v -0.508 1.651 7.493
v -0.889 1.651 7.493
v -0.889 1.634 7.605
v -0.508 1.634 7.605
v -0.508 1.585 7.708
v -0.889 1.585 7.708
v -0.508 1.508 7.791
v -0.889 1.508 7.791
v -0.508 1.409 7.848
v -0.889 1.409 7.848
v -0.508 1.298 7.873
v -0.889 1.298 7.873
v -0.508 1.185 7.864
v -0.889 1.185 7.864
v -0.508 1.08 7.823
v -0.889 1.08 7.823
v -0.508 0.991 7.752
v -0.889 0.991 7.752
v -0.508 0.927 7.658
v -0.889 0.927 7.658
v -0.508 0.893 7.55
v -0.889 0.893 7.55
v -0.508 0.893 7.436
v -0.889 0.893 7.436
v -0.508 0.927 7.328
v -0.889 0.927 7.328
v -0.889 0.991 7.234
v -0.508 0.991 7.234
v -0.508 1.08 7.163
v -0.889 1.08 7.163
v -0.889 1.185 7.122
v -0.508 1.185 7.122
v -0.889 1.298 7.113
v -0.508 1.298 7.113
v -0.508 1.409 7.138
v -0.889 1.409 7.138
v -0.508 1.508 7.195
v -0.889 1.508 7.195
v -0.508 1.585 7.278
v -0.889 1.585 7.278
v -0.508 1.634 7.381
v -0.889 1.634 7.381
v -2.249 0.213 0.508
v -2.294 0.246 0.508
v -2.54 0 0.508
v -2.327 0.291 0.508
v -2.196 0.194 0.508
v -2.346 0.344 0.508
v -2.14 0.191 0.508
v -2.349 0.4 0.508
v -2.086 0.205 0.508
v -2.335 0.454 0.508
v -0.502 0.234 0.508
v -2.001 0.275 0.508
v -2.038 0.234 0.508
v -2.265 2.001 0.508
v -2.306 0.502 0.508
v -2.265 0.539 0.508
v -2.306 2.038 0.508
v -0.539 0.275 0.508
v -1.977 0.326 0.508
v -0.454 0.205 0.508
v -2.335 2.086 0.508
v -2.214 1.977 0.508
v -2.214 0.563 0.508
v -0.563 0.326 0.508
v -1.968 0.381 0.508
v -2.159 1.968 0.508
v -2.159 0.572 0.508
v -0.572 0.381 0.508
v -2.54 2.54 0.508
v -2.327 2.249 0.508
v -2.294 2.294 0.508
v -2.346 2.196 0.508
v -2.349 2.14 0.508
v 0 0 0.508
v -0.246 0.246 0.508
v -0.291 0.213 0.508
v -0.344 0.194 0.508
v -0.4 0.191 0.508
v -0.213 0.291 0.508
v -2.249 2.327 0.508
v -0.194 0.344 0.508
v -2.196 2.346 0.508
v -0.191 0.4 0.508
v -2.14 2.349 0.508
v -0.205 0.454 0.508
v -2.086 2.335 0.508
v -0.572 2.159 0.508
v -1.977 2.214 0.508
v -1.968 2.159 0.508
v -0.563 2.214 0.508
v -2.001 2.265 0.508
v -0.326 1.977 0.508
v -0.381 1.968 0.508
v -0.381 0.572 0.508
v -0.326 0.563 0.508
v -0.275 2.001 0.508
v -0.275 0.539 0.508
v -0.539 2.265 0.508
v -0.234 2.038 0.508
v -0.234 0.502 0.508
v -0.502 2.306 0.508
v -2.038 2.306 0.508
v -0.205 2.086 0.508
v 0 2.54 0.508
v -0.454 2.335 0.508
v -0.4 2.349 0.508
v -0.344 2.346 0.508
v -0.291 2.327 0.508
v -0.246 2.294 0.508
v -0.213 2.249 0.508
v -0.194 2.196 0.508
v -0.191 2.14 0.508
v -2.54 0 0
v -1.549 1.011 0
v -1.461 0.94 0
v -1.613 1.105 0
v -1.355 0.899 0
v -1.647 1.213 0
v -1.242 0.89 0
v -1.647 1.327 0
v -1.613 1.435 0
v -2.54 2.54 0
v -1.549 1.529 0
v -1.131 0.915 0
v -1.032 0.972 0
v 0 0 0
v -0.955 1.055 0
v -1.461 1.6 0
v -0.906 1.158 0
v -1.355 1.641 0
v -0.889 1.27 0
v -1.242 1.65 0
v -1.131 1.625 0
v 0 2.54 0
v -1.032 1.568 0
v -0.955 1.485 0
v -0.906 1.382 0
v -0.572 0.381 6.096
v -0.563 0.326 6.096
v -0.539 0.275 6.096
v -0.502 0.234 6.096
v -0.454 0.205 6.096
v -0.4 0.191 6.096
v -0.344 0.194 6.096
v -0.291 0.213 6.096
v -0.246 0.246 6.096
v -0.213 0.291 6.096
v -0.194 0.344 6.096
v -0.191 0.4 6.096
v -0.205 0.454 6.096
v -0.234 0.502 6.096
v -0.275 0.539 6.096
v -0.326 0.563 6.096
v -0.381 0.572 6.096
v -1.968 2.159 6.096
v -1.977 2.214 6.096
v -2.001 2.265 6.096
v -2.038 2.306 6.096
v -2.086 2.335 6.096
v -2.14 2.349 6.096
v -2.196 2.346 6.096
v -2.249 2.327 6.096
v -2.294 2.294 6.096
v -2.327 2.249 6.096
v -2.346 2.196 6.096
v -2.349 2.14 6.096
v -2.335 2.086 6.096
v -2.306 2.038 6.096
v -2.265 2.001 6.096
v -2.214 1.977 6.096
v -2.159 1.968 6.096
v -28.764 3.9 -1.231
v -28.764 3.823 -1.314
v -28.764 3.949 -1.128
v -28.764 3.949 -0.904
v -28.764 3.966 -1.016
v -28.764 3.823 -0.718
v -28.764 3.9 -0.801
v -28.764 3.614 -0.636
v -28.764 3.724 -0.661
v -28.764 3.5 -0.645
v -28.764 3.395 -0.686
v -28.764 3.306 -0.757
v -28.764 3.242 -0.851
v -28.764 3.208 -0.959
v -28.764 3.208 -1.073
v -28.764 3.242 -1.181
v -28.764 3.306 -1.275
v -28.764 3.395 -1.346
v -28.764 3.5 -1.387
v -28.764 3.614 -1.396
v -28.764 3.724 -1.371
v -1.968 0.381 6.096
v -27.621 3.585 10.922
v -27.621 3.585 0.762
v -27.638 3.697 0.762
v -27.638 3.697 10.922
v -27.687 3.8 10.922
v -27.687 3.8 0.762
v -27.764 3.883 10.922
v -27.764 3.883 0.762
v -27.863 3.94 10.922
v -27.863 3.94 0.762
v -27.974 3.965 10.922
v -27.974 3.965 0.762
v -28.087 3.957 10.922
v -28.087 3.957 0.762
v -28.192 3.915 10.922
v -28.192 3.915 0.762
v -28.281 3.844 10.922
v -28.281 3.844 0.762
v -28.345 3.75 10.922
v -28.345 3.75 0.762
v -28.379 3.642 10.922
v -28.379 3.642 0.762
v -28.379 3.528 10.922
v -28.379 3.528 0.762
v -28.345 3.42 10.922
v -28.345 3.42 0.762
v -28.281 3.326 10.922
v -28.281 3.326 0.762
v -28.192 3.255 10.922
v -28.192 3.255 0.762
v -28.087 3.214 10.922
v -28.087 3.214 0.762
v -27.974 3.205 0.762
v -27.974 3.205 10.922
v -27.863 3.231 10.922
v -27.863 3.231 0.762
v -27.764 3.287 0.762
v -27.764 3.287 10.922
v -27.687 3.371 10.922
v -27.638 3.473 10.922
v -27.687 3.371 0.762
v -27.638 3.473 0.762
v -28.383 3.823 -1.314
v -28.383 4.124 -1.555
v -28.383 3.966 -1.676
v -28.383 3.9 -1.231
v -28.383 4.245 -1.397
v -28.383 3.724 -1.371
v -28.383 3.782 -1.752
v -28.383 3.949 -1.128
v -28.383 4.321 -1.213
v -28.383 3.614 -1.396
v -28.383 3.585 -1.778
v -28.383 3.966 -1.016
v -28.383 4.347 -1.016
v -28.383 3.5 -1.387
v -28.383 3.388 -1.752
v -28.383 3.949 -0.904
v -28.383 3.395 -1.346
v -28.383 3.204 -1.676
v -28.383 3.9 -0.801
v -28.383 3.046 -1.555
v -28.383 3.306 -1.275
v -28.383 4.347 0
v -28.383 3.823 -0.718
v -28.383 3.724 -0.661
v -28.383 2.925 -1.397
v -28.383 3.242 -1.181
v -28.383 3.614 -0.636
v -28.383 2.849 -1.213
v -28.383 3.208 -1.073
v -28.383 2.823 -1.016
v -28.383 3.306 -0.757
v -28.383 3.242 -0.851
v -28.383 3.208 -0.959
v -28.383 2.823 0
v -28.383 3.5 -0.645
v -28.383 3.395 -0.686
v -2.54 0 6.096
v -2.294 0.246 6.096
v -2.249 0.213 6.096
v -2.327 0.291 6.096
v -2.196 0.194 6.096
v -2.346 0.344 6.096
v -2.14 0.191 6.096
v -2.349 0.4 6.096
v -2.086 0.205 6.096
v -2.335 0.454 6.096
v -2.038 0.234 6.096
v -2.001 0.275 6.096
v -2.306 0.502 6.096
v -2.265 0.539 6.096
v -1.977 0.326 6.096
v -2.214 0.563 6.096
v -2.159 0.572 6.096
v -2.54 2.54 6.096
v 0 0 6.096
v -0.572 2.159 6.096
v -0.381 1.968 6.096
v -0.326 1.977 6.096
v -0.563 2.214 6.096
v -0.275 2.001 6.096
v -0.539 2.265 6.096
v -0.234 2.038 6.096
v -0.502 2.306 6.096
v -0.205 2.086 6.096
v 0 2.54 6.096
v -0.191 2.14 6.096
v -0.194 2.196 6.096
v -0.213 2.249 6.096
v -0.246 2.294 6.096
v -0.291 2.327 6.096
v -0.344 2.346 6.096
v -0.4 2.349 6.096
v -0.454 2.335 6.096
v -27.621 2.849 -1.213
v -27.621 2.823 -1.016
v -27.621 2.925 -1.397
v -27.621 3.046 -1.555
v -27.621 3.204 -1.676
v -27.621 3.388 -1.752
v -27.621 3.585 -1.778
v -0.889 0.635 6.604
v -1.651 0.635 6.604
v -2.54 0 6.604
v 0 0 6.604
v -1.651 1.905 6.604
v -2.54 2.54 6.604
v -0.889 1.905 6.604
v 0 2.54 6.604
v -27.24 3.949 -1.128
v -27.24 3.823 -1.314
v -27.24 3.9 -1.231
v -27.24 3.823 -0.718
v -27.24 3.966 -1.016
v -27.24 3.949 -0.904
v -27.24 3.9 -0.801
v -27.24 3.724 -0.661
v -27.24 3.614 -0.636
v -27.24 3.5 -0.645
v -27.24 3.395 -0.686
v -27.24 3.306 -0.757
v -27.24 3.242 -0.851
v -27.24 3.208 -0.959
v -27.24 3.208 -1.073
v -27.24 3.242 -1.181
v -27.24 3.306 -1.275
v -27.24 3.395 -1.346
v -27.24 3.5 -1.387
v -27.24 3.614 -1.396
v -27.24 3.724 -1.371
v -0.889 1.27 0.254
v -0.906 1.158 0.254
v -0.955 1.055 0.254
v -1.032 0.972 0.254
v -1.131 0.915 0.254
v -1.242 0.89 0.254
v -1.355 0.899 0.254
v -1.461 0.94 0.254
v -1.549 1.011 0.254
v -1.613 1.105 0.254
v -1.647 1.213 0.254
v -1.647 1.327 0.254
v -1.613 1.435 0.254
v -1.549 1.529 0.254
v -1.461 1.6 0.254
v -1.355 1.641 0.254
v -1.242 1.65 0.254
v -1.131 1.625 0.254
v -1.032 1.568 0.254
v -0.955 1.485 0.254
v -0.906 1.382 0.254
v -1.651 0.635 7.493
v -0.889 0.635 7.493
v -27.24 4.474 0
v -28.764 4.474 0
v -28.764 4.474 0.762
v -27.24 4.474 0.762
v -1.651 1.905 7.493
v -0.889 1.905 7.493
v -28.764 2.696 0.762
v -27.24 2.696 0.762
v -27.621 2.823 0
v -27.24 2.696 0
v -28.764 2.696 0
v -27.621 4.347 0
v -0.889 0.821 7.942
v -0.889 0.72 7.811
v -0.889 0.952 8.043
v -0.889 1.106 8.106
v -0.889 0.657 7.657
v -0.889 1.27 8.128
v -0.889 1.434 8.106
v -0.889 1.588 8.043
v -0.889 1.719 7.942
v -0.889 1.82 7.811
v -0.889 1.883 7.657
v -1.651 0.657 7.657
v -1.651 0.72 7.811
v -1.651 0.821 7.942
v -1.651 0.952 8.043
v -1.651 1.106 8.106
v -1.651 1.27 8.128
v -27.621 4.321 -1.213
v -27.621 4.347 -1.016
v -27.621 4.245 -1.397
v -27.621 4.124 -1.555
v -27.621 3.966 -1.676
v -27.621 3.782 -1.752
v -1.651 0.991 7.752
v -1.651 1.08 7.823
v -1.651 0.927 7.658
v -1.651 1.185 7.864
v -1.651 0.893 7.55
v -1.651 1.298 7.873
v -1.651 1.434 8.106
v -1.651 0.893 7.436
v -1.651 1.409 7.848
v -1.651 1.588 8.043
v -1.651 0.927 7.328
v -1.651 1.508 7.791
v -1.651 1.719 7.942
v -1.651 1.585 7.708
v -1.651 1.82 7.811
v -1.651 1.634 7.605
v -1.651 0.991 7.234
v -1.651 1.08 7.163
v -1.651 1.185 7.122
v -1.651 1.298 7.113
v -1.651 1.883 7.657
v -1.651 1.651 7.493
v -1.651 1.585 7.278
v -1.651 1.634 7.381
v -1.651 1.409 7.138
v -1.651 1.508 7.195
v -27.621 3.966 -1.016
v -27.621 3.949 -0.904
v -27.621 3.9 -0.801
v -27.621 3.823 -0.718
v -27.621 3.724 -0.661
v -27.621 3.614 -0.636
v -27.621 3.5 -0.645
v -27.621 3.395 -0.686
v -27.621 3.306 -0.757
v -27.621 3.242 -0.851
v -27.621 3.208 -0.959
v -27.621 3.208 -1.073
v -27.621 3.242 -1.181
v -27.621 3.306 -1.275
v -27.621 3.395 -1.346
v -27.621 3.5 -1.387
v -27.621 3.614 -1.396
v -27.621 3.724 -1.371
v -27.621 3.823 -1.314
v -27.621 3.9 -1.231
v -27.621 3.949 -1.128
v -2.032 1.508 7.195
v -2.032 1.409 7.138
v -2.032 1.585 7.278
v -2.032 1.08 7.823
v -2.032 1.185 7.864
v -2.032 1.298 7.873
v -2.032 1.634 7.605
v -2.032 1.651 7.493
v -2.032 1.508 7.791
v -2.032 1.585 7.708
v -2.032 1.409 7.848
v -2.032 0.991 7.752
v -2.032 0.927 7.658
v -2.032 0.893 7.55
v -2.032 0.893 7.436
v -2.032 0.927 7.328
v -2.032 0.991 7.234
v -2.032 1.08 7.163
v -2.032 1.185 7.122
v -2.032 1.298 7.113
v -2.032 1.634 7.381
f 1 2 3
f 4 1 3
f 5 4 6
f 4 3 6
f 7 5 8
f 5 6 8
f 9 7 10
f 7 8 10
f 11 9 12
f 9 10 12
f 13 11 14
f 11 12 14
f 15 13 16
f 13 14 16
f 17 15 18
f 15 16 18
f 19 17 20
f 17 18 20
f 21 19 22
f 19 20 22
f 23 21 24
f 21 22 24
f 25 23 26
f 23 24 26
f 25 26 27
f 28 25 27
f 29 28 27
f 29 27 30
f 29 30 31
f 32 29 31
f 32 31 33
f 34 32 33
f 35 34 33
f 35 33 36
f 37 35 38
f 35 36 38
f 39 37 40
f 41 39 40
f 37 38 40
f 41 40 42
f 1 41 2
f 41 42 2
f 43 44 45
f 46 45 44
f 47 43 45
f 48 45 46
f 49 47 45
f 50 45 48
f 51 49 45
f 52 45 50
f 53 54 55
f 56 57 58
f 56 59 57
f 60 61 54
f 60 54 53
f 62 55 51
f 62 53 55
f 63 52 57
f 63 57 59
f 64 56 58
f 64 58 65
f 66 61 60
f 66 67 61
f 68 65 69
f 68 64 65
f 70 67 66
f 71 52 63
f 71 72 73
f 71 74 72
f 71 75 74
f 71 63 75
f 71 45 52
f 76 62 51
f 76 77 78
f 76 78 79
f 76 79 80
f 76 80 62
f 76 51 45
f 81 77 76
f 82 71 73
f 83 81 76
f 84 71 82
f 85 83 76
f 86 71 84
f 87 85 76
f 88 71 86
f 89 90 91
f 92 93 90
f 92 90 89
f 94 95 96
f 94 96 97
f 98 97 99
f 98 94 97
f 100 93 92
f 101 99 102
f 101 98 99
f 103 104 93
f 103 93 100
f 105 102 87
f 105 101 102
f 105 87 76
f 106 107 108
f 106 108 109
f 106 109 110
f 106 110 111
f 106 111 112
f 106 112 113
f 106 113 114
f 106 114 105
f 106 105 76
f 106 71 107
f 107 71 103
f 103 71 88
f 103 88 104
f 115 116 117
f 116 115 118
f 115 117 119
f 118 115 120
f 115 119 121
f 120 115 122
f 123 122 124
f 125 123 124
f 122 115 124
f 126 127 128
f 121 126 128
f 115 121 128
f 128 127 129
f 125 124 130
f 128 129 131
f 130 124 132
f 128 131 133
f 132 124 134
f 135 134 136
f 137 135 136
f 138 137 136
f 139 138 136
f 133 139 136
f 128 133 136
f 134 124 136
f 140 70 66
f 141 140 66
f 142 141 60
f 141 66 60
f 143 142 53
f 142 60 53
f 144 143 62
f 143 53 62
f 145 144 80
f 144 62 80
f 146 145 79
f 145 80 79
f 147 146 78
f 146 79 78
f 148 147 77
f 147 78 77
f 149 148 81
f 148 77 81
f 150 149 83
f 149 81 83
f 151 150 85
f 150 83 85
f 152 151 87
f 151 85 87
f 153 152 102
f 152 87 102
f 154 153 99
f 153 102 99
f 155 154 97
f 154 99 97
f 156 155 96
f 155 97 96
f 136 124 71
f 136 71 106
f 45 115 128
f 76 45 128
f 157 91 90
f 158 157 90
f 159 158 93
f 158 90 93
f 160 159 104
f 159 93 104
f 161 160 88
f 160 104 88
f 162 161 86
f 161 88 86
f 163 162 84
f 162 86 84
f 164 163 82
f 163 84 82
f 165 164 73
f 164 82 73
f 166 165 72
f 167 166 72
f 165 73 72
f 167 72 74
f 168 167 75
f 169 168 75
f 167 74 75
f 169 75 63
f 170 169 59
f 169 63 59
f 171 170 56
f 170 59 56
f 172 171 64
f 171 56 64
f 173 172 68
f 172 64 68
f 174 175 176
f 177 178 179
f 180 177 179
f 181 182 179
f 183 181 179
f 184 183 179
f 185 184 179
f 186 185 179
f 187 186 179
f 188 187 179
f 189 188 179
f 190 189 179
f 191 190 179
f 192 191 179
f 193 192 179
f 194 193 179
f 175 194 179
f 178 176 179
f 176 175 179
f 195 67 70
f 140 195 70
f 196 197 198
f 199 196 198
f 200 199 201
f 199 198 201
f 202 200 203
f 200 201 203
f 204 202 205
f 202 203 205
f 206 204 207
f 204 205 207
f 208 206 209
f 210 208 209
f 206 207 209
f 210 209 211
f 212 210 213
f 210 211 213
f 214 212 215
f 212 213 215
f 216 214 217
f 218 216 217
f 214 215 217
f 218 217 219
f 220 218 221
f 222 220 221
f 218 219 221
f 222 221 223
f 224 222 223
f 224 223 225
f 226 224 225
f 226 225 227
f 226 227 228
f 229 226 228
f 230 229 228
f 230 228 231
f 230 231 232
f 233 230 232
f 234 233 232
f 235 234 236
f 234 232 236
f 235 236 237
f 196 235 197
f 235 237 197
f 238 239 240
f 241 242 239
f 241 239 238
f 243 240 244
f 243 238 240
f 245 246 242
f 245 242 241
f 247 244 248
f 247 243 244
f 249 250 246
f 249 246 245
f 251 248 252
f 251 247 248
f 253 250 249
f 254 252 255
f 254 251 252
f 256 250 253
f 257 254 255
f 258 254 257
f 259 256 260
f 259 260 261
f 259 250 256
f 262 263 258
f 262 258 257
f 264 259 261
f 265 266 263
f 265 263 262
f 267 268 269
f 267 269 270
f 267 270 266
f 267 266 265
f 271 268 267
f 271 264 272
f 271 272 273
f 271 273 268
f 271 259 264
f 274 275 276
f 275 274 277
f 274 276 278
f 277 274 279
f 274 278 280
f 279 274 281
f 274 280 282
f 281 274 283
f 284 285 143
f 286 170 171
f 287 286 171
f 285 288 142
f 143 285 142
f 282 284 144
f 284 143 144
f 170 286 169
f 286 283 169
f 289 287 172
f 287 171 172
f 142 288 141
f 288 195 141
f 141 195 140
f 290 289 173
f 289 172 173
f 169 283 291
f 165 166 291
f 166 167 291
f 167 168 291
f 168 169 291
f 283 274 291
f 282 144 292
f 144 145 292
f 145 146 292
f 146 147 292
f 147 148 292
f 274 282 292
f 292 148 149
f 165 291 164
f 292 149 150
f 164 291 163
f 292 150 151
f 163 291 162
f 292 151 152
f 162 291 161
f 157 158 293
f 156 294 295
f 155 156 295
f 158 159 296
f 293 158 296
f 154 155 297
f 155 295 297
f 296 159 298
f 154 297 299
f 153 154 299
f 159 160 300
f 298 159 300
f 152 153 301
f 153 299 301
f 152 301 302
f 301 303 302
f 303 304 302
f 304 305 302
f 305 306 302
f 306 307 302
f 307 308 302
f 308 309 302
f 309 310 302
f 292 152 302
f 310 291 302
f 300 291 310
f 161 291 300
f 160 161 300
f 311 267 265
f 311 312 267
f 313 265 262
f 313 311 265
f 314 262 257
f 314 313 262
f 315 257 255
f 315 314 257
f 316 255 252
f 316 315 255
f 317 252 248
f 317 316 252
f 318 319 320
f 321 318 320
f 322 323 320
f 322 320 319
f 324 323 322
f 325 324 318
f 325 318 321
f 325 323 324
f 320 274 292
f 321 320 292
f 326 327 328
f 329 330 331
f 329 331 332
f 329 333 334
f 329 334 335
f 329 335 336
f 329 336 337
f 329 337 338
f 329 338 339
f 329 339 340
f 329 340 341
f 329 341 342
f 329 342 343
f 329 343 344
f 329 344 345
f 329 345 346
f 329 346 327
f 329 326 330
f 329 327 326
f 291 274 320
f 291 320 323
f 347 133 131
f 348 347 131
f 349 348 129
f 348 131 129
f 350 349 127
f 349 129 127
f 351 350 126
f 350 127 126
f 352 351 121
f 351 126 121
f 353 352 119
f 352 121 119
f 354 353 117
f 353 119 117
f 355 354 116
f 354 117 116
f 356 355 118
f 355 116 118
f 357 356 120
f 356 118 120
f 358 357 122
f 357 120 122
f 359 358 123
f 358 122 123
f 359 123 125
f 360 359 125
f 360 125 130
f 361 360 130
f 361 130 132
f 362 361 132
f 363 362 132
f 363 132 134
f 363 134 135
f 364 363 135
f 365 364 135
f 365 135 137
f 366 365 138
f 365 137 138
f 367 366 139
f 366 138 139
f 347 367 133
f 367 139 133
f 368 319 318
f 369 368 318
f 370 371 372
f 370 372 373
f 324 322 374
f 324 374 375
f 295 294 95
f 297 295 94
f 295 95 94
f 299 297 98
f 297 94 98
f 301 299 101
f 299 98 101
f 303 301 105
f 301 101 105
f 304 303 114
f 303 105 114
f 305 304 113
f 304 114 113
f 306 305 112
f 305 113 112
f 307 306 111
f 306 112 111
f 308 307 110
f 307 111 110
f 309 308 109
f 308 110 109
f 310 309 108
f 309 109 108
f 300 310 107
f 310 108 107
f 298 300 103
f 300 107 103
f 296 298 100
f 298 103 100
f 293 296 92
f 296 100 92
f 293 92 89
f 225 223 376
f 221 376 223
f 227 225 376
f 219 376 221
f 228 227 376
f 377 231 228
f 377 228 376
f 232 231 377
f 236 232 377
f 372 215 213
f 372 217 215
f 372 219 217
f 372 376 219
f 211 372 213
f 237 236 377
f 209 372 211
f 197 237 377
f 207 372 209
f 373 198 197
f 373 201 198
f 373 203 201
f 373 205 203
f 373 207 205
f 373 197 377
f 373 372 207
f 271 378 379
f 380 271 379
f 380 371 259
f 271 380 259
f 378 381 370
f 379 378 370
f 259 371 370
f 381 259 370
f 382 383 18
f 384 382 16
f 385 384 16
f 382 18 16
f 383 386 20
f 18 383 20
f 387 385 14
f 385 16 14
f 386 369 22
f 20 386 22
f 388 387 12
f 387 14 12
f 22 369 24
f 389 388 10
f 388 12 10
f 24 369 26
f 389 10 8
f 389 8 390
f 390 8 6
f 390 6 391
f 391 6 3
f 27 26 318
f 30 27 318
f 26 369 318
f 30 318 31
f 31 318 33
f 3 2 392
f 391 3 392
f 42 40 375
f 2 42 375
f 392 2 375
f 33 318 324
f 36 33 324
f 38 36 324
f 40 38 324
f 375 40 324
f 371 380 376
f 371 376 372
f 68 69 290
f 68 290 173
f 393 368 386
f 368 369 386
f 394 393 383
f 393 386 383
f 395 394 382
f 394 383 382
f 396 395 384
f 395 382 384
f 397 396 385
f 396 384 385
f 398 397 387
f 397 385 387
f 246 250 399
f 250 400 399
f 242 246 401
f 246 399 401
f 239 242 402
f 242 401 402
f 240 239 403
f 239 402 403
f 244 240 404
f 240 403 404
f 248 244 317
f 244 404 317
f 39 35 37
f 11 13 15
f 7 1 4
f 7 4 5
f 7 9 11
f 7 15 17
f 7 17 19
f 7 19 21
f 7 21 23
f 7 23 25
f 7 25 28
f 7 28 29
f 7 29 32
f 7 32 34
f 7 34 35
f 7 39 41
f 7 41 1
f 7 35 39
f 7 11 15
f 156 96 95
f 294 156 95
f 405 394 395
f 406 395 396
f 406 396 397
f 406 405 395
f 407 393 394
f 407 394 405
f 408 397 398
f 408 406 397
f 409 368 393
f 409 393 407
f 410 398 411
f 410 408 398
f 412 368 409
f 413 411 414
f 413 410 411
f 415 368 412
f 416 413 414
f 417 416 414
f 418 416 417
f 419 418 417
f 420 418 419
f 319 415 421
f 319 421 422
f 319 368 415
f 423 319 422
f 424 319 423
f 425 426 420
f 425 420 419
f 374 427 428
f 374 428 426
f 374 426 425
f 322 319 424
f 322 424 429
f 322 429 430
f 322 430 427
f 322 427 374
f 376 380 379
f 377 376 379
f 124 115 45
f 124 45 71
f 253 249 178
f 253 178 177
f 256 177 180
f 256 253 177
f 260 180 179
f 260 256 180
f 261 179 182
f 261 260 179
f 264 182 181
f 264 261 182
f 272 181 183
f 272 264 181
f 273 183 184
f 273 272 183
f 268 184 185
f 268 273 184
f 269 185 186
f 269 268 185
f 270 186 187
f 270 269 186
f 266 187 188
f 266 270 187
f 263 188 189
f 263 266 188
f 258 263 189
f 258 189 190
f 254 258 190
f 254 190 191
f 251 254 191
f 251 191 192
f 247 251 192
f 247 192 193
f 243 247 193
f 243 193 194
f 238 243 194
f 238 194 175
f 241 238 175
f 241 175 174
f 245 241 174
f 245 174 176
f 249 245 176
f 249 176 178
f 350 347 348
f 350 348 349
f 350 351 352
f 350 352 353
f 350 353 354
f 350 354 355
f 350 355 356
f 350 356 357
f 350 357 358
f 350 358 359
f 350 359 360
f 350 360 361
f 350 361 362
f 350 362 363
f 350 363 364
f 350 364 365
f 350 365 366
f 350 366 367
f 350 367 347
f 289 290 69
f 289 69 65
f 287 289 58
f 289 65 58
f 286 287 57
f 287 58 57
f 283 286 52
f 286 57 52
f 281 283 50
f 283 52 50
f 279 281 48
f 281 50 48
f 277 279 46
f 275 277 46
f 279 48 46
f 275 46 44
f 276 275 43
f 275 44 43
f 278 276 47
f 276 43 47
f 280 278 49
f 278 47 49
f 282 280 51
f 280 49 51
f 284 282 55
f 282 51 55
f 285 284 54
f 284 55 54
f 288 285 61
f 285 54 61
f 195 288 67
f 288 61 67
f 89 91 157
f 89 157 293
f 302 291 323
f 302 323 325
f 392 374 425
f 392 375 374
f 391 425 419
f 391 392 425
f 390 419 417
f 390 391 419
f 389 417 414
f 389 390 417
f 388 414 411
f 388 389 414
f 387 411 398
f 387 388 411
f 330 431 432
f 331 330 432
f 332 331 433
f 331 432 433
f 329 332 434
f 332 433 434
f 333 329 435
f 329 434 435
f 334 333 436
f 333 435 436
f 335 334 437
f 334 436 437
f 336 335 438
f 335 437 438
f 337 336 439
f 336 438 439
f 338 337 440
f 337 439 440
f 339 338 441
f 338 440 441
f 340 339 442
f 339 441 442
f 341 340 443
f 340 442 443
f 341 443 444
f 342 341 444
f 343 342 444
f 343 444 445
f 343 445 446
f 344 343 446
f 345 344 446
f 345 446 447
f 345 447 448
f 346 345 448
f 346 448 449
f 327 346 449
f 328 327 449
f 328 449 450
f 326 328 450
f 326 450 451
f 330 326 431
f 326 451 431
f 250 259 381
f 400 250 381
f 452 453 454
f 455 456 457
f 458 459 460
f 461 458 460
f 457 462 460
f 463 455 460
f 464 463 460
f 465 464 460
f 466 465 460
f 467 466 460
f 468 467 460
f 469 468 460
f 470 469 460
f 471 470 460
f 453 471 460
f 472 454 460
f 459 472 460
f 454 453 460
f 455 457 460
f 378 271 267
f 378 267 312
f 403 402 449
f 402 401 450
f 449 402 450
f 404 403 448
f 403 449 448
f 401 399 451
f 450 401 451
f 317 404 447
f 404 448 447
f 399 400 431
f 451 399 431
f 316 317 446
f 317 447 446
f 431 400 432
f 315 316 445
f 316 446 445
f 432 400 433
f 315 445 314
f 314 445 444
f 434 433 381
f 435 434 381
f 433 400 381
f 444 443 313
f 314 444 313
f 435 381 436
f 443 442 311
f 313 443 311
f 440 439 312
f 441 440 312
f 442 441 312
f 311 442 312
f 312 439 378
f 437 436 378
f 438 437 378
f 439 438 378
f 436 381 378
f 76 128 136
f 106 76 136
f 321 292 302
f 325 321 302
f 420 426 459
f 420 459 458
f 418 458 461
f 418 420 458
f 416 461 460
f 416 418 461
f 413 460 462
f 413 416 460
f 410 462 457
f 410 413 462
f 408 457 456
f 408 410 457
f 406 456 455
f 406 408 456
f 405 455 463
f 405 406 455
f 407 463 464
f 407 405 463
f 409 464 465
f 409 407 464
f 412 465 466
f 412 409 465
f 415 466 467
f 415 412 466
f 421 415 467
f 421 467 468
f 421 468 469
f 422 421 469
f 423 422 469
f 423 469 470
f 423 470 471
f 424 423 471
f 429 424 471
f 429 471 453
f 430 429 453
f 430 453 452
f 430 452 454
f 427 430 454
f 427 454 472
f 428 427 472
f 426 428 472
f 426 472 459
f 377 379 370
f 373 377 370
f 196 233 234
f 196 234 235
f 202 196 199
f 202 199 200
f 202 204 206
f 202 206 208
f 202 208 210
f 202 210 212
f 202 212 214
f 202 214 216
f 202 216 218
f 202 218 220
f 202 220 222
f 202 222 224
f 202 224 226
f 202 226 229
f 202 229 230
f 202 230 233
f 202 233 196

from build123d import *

# Parameters (mm, degrees)
F0_W           = 2.54
F0_H           = 2.54
F1_DEPTH       = 0.508
F3_R           = 0.1905
F2_W           = 1.778
F2_H           = 1.778
F4_DEPTH       = 5.588
F5_W           = 2.54
F5_H           = 2.54
F6_DEPTH       = 0.508
F7_W           = 0.762
F7_H           = 1.27
F8_DEPTH       = 1.524
F9_R           = 0.63499
F10_R          = 0.381
F11_DEPTH      = 0.254
F12_W          = 1.524
F12_H          = 1.778
F13_DEPTH      = 0.762
F14_R          = 0.381
F15_DEPTH      = 10.16
F16_W          = 0.762
F16_H          = 1.524
F17_DEPTH      = 1.778
F18_R          = 0.76199
F19_R          = 0.381
F20_DEPTH      = 0.381
F20_DEPTH_BACK = 1.143
F21_R          = 0.381
F22_DEPTH      = 0.381
F22_DEPTH_BACK = 1.143


# Not quite as in the source:
# - a fillet or chamfer is up to 0.001 mm smaller than in the source, because OpenCascade refuses the exact size
# - a feature names something its author has since deleted; it is built from what else it names


with BuildPart() as f1:
    # F0 (on Top) → F1 (new body)
    with BuildSketch(Plane.XY):
        with Locations((-1.27, 1.27)):
            Rectangle(F0_W, F0_H)
    extrude(amount=F1_DEPTH)

    # F3 (on face) + F2 (on face) → F4 (join)
    with BuildSketch(Plane.XY.offset(0.508)):
        with Locations((-2.159, 0.381)):
            Circle(F3_R)
        with Locations((-0.381, 0.381)):
            Circle(F3_R)
        with Locations((-0.381, 2.159)):
            Circle(F3_R)
        with Locations((-2.159, 2.159)):
            Circle(F3_R)
    with BuildSketch(Plane.XY.offset(0.508)):
        with Locations((-1.27, 1.27)):
            Rectangle(F2_W, F2_H)
    extrude(amount=F4_DEPTH)

    # F5 (on face) → F6 (join)
    with BuildSketch(Plane.XY.offset(6.096)):
        with Locations((-1.27, 1.27)):
            Rectangle(F5_W, F5_H)
    extrude(amount=F6_DEPTH)

    # F7 (on face) → F8 (join)
    with BuildSketch(Plane.XY.offset(6.604)):
        with Locations((-1.27, 1.27)):
            Rectangle(F7_W, F7_H)
    extrude(amount=F8_DEPTH)

    # F9 (radius 0.635 in the source; OpenCascade refuses exactly that, so slightly less here)
    f9_edges = [f1.edges().sort_by_distance(p)[0] for p in [
        (-1.27, 0.635, 8.128),
        (-1.27, 1.905, 8.128),
    ]]
    fillet(f9_edges, radius=F9_R)

    # F10 (on face) → F11 (cut)
    with BuildSketch(Plane(origin=(0, 0, 0), x_dir=(1, 0, 0), z_dir=(0, 0, -1))):
        with Locations((-1.27, -1.27)):
            Circle(F10_R)
    extrude(amount=-F11_DEPTH, mode=Mode.SUBTRACT)

    # F19 (on face) → F20 (join, two sides)
    with BuildSketch(Plane.YZ.offset(-0.889)) as f20_sk:
        with Locations((1.27, 7.493)):
            Circle(F19_R)
    extrude(amount=F20_DEPTH)
    extrude(f20_sk.sketch, amount=-F20_DEPTH_BACK)


with BuildPart() as f13:
    # F12 (on Top) → F13 (new body)
    with BuildSketch(Plane.XY):
        with Locations((-28.0019982215, 3.5851696832)):
            Rectangle(F12_W, F12_H)
    extrude(amount=F13_DEPTH)

    # F14 (on face) → F15 (join)
    with BuildSketch(Plane.XY.offset(0.762)):
        with Locations((-28.0019982215, 3.5851696832)):
            Circle(F14_R)
    extrude(amount=F15_DEPTH)

    # F16 (on face) → F17 (join)
    with BuildSketch(Plane(origin=(0, 0, 0), x_dir=(1, 0, 0), z_dir=(0, 0, -1))):
        with Locations((-28.0019982215, -3.5851696832)):
            Rectangle(F16_W, F16_H)
    extrude(amount=F17_DEPTH)

    # F18 (radius 0.762 in the source; OpenCascade refuses exactly that, so slightly less here)
    f18_edges = [f13.edges().sort_by_distance(p)[0] for p in [
        (-28.001998, 2.82317, -1.778),
        (-28.001998, 4.34717, -1.778),
    ]]
    fillet(f18_edges, radius=F18_R)

    # F21 (on face) → F22 (join, two sides)
    with BuildSketch(Plane.YZ.offset(-27.6209982215)) as f22_sk:
        with Locations((3.5851696832, -1.016)):
            Circle(F21_R)
    extrude(amount=F22_DEPTH)
    extrude(f22_sk.sketch, amount=-F22_DEPTH_BACK)


solid = Compound([f1.part, f13.part])
